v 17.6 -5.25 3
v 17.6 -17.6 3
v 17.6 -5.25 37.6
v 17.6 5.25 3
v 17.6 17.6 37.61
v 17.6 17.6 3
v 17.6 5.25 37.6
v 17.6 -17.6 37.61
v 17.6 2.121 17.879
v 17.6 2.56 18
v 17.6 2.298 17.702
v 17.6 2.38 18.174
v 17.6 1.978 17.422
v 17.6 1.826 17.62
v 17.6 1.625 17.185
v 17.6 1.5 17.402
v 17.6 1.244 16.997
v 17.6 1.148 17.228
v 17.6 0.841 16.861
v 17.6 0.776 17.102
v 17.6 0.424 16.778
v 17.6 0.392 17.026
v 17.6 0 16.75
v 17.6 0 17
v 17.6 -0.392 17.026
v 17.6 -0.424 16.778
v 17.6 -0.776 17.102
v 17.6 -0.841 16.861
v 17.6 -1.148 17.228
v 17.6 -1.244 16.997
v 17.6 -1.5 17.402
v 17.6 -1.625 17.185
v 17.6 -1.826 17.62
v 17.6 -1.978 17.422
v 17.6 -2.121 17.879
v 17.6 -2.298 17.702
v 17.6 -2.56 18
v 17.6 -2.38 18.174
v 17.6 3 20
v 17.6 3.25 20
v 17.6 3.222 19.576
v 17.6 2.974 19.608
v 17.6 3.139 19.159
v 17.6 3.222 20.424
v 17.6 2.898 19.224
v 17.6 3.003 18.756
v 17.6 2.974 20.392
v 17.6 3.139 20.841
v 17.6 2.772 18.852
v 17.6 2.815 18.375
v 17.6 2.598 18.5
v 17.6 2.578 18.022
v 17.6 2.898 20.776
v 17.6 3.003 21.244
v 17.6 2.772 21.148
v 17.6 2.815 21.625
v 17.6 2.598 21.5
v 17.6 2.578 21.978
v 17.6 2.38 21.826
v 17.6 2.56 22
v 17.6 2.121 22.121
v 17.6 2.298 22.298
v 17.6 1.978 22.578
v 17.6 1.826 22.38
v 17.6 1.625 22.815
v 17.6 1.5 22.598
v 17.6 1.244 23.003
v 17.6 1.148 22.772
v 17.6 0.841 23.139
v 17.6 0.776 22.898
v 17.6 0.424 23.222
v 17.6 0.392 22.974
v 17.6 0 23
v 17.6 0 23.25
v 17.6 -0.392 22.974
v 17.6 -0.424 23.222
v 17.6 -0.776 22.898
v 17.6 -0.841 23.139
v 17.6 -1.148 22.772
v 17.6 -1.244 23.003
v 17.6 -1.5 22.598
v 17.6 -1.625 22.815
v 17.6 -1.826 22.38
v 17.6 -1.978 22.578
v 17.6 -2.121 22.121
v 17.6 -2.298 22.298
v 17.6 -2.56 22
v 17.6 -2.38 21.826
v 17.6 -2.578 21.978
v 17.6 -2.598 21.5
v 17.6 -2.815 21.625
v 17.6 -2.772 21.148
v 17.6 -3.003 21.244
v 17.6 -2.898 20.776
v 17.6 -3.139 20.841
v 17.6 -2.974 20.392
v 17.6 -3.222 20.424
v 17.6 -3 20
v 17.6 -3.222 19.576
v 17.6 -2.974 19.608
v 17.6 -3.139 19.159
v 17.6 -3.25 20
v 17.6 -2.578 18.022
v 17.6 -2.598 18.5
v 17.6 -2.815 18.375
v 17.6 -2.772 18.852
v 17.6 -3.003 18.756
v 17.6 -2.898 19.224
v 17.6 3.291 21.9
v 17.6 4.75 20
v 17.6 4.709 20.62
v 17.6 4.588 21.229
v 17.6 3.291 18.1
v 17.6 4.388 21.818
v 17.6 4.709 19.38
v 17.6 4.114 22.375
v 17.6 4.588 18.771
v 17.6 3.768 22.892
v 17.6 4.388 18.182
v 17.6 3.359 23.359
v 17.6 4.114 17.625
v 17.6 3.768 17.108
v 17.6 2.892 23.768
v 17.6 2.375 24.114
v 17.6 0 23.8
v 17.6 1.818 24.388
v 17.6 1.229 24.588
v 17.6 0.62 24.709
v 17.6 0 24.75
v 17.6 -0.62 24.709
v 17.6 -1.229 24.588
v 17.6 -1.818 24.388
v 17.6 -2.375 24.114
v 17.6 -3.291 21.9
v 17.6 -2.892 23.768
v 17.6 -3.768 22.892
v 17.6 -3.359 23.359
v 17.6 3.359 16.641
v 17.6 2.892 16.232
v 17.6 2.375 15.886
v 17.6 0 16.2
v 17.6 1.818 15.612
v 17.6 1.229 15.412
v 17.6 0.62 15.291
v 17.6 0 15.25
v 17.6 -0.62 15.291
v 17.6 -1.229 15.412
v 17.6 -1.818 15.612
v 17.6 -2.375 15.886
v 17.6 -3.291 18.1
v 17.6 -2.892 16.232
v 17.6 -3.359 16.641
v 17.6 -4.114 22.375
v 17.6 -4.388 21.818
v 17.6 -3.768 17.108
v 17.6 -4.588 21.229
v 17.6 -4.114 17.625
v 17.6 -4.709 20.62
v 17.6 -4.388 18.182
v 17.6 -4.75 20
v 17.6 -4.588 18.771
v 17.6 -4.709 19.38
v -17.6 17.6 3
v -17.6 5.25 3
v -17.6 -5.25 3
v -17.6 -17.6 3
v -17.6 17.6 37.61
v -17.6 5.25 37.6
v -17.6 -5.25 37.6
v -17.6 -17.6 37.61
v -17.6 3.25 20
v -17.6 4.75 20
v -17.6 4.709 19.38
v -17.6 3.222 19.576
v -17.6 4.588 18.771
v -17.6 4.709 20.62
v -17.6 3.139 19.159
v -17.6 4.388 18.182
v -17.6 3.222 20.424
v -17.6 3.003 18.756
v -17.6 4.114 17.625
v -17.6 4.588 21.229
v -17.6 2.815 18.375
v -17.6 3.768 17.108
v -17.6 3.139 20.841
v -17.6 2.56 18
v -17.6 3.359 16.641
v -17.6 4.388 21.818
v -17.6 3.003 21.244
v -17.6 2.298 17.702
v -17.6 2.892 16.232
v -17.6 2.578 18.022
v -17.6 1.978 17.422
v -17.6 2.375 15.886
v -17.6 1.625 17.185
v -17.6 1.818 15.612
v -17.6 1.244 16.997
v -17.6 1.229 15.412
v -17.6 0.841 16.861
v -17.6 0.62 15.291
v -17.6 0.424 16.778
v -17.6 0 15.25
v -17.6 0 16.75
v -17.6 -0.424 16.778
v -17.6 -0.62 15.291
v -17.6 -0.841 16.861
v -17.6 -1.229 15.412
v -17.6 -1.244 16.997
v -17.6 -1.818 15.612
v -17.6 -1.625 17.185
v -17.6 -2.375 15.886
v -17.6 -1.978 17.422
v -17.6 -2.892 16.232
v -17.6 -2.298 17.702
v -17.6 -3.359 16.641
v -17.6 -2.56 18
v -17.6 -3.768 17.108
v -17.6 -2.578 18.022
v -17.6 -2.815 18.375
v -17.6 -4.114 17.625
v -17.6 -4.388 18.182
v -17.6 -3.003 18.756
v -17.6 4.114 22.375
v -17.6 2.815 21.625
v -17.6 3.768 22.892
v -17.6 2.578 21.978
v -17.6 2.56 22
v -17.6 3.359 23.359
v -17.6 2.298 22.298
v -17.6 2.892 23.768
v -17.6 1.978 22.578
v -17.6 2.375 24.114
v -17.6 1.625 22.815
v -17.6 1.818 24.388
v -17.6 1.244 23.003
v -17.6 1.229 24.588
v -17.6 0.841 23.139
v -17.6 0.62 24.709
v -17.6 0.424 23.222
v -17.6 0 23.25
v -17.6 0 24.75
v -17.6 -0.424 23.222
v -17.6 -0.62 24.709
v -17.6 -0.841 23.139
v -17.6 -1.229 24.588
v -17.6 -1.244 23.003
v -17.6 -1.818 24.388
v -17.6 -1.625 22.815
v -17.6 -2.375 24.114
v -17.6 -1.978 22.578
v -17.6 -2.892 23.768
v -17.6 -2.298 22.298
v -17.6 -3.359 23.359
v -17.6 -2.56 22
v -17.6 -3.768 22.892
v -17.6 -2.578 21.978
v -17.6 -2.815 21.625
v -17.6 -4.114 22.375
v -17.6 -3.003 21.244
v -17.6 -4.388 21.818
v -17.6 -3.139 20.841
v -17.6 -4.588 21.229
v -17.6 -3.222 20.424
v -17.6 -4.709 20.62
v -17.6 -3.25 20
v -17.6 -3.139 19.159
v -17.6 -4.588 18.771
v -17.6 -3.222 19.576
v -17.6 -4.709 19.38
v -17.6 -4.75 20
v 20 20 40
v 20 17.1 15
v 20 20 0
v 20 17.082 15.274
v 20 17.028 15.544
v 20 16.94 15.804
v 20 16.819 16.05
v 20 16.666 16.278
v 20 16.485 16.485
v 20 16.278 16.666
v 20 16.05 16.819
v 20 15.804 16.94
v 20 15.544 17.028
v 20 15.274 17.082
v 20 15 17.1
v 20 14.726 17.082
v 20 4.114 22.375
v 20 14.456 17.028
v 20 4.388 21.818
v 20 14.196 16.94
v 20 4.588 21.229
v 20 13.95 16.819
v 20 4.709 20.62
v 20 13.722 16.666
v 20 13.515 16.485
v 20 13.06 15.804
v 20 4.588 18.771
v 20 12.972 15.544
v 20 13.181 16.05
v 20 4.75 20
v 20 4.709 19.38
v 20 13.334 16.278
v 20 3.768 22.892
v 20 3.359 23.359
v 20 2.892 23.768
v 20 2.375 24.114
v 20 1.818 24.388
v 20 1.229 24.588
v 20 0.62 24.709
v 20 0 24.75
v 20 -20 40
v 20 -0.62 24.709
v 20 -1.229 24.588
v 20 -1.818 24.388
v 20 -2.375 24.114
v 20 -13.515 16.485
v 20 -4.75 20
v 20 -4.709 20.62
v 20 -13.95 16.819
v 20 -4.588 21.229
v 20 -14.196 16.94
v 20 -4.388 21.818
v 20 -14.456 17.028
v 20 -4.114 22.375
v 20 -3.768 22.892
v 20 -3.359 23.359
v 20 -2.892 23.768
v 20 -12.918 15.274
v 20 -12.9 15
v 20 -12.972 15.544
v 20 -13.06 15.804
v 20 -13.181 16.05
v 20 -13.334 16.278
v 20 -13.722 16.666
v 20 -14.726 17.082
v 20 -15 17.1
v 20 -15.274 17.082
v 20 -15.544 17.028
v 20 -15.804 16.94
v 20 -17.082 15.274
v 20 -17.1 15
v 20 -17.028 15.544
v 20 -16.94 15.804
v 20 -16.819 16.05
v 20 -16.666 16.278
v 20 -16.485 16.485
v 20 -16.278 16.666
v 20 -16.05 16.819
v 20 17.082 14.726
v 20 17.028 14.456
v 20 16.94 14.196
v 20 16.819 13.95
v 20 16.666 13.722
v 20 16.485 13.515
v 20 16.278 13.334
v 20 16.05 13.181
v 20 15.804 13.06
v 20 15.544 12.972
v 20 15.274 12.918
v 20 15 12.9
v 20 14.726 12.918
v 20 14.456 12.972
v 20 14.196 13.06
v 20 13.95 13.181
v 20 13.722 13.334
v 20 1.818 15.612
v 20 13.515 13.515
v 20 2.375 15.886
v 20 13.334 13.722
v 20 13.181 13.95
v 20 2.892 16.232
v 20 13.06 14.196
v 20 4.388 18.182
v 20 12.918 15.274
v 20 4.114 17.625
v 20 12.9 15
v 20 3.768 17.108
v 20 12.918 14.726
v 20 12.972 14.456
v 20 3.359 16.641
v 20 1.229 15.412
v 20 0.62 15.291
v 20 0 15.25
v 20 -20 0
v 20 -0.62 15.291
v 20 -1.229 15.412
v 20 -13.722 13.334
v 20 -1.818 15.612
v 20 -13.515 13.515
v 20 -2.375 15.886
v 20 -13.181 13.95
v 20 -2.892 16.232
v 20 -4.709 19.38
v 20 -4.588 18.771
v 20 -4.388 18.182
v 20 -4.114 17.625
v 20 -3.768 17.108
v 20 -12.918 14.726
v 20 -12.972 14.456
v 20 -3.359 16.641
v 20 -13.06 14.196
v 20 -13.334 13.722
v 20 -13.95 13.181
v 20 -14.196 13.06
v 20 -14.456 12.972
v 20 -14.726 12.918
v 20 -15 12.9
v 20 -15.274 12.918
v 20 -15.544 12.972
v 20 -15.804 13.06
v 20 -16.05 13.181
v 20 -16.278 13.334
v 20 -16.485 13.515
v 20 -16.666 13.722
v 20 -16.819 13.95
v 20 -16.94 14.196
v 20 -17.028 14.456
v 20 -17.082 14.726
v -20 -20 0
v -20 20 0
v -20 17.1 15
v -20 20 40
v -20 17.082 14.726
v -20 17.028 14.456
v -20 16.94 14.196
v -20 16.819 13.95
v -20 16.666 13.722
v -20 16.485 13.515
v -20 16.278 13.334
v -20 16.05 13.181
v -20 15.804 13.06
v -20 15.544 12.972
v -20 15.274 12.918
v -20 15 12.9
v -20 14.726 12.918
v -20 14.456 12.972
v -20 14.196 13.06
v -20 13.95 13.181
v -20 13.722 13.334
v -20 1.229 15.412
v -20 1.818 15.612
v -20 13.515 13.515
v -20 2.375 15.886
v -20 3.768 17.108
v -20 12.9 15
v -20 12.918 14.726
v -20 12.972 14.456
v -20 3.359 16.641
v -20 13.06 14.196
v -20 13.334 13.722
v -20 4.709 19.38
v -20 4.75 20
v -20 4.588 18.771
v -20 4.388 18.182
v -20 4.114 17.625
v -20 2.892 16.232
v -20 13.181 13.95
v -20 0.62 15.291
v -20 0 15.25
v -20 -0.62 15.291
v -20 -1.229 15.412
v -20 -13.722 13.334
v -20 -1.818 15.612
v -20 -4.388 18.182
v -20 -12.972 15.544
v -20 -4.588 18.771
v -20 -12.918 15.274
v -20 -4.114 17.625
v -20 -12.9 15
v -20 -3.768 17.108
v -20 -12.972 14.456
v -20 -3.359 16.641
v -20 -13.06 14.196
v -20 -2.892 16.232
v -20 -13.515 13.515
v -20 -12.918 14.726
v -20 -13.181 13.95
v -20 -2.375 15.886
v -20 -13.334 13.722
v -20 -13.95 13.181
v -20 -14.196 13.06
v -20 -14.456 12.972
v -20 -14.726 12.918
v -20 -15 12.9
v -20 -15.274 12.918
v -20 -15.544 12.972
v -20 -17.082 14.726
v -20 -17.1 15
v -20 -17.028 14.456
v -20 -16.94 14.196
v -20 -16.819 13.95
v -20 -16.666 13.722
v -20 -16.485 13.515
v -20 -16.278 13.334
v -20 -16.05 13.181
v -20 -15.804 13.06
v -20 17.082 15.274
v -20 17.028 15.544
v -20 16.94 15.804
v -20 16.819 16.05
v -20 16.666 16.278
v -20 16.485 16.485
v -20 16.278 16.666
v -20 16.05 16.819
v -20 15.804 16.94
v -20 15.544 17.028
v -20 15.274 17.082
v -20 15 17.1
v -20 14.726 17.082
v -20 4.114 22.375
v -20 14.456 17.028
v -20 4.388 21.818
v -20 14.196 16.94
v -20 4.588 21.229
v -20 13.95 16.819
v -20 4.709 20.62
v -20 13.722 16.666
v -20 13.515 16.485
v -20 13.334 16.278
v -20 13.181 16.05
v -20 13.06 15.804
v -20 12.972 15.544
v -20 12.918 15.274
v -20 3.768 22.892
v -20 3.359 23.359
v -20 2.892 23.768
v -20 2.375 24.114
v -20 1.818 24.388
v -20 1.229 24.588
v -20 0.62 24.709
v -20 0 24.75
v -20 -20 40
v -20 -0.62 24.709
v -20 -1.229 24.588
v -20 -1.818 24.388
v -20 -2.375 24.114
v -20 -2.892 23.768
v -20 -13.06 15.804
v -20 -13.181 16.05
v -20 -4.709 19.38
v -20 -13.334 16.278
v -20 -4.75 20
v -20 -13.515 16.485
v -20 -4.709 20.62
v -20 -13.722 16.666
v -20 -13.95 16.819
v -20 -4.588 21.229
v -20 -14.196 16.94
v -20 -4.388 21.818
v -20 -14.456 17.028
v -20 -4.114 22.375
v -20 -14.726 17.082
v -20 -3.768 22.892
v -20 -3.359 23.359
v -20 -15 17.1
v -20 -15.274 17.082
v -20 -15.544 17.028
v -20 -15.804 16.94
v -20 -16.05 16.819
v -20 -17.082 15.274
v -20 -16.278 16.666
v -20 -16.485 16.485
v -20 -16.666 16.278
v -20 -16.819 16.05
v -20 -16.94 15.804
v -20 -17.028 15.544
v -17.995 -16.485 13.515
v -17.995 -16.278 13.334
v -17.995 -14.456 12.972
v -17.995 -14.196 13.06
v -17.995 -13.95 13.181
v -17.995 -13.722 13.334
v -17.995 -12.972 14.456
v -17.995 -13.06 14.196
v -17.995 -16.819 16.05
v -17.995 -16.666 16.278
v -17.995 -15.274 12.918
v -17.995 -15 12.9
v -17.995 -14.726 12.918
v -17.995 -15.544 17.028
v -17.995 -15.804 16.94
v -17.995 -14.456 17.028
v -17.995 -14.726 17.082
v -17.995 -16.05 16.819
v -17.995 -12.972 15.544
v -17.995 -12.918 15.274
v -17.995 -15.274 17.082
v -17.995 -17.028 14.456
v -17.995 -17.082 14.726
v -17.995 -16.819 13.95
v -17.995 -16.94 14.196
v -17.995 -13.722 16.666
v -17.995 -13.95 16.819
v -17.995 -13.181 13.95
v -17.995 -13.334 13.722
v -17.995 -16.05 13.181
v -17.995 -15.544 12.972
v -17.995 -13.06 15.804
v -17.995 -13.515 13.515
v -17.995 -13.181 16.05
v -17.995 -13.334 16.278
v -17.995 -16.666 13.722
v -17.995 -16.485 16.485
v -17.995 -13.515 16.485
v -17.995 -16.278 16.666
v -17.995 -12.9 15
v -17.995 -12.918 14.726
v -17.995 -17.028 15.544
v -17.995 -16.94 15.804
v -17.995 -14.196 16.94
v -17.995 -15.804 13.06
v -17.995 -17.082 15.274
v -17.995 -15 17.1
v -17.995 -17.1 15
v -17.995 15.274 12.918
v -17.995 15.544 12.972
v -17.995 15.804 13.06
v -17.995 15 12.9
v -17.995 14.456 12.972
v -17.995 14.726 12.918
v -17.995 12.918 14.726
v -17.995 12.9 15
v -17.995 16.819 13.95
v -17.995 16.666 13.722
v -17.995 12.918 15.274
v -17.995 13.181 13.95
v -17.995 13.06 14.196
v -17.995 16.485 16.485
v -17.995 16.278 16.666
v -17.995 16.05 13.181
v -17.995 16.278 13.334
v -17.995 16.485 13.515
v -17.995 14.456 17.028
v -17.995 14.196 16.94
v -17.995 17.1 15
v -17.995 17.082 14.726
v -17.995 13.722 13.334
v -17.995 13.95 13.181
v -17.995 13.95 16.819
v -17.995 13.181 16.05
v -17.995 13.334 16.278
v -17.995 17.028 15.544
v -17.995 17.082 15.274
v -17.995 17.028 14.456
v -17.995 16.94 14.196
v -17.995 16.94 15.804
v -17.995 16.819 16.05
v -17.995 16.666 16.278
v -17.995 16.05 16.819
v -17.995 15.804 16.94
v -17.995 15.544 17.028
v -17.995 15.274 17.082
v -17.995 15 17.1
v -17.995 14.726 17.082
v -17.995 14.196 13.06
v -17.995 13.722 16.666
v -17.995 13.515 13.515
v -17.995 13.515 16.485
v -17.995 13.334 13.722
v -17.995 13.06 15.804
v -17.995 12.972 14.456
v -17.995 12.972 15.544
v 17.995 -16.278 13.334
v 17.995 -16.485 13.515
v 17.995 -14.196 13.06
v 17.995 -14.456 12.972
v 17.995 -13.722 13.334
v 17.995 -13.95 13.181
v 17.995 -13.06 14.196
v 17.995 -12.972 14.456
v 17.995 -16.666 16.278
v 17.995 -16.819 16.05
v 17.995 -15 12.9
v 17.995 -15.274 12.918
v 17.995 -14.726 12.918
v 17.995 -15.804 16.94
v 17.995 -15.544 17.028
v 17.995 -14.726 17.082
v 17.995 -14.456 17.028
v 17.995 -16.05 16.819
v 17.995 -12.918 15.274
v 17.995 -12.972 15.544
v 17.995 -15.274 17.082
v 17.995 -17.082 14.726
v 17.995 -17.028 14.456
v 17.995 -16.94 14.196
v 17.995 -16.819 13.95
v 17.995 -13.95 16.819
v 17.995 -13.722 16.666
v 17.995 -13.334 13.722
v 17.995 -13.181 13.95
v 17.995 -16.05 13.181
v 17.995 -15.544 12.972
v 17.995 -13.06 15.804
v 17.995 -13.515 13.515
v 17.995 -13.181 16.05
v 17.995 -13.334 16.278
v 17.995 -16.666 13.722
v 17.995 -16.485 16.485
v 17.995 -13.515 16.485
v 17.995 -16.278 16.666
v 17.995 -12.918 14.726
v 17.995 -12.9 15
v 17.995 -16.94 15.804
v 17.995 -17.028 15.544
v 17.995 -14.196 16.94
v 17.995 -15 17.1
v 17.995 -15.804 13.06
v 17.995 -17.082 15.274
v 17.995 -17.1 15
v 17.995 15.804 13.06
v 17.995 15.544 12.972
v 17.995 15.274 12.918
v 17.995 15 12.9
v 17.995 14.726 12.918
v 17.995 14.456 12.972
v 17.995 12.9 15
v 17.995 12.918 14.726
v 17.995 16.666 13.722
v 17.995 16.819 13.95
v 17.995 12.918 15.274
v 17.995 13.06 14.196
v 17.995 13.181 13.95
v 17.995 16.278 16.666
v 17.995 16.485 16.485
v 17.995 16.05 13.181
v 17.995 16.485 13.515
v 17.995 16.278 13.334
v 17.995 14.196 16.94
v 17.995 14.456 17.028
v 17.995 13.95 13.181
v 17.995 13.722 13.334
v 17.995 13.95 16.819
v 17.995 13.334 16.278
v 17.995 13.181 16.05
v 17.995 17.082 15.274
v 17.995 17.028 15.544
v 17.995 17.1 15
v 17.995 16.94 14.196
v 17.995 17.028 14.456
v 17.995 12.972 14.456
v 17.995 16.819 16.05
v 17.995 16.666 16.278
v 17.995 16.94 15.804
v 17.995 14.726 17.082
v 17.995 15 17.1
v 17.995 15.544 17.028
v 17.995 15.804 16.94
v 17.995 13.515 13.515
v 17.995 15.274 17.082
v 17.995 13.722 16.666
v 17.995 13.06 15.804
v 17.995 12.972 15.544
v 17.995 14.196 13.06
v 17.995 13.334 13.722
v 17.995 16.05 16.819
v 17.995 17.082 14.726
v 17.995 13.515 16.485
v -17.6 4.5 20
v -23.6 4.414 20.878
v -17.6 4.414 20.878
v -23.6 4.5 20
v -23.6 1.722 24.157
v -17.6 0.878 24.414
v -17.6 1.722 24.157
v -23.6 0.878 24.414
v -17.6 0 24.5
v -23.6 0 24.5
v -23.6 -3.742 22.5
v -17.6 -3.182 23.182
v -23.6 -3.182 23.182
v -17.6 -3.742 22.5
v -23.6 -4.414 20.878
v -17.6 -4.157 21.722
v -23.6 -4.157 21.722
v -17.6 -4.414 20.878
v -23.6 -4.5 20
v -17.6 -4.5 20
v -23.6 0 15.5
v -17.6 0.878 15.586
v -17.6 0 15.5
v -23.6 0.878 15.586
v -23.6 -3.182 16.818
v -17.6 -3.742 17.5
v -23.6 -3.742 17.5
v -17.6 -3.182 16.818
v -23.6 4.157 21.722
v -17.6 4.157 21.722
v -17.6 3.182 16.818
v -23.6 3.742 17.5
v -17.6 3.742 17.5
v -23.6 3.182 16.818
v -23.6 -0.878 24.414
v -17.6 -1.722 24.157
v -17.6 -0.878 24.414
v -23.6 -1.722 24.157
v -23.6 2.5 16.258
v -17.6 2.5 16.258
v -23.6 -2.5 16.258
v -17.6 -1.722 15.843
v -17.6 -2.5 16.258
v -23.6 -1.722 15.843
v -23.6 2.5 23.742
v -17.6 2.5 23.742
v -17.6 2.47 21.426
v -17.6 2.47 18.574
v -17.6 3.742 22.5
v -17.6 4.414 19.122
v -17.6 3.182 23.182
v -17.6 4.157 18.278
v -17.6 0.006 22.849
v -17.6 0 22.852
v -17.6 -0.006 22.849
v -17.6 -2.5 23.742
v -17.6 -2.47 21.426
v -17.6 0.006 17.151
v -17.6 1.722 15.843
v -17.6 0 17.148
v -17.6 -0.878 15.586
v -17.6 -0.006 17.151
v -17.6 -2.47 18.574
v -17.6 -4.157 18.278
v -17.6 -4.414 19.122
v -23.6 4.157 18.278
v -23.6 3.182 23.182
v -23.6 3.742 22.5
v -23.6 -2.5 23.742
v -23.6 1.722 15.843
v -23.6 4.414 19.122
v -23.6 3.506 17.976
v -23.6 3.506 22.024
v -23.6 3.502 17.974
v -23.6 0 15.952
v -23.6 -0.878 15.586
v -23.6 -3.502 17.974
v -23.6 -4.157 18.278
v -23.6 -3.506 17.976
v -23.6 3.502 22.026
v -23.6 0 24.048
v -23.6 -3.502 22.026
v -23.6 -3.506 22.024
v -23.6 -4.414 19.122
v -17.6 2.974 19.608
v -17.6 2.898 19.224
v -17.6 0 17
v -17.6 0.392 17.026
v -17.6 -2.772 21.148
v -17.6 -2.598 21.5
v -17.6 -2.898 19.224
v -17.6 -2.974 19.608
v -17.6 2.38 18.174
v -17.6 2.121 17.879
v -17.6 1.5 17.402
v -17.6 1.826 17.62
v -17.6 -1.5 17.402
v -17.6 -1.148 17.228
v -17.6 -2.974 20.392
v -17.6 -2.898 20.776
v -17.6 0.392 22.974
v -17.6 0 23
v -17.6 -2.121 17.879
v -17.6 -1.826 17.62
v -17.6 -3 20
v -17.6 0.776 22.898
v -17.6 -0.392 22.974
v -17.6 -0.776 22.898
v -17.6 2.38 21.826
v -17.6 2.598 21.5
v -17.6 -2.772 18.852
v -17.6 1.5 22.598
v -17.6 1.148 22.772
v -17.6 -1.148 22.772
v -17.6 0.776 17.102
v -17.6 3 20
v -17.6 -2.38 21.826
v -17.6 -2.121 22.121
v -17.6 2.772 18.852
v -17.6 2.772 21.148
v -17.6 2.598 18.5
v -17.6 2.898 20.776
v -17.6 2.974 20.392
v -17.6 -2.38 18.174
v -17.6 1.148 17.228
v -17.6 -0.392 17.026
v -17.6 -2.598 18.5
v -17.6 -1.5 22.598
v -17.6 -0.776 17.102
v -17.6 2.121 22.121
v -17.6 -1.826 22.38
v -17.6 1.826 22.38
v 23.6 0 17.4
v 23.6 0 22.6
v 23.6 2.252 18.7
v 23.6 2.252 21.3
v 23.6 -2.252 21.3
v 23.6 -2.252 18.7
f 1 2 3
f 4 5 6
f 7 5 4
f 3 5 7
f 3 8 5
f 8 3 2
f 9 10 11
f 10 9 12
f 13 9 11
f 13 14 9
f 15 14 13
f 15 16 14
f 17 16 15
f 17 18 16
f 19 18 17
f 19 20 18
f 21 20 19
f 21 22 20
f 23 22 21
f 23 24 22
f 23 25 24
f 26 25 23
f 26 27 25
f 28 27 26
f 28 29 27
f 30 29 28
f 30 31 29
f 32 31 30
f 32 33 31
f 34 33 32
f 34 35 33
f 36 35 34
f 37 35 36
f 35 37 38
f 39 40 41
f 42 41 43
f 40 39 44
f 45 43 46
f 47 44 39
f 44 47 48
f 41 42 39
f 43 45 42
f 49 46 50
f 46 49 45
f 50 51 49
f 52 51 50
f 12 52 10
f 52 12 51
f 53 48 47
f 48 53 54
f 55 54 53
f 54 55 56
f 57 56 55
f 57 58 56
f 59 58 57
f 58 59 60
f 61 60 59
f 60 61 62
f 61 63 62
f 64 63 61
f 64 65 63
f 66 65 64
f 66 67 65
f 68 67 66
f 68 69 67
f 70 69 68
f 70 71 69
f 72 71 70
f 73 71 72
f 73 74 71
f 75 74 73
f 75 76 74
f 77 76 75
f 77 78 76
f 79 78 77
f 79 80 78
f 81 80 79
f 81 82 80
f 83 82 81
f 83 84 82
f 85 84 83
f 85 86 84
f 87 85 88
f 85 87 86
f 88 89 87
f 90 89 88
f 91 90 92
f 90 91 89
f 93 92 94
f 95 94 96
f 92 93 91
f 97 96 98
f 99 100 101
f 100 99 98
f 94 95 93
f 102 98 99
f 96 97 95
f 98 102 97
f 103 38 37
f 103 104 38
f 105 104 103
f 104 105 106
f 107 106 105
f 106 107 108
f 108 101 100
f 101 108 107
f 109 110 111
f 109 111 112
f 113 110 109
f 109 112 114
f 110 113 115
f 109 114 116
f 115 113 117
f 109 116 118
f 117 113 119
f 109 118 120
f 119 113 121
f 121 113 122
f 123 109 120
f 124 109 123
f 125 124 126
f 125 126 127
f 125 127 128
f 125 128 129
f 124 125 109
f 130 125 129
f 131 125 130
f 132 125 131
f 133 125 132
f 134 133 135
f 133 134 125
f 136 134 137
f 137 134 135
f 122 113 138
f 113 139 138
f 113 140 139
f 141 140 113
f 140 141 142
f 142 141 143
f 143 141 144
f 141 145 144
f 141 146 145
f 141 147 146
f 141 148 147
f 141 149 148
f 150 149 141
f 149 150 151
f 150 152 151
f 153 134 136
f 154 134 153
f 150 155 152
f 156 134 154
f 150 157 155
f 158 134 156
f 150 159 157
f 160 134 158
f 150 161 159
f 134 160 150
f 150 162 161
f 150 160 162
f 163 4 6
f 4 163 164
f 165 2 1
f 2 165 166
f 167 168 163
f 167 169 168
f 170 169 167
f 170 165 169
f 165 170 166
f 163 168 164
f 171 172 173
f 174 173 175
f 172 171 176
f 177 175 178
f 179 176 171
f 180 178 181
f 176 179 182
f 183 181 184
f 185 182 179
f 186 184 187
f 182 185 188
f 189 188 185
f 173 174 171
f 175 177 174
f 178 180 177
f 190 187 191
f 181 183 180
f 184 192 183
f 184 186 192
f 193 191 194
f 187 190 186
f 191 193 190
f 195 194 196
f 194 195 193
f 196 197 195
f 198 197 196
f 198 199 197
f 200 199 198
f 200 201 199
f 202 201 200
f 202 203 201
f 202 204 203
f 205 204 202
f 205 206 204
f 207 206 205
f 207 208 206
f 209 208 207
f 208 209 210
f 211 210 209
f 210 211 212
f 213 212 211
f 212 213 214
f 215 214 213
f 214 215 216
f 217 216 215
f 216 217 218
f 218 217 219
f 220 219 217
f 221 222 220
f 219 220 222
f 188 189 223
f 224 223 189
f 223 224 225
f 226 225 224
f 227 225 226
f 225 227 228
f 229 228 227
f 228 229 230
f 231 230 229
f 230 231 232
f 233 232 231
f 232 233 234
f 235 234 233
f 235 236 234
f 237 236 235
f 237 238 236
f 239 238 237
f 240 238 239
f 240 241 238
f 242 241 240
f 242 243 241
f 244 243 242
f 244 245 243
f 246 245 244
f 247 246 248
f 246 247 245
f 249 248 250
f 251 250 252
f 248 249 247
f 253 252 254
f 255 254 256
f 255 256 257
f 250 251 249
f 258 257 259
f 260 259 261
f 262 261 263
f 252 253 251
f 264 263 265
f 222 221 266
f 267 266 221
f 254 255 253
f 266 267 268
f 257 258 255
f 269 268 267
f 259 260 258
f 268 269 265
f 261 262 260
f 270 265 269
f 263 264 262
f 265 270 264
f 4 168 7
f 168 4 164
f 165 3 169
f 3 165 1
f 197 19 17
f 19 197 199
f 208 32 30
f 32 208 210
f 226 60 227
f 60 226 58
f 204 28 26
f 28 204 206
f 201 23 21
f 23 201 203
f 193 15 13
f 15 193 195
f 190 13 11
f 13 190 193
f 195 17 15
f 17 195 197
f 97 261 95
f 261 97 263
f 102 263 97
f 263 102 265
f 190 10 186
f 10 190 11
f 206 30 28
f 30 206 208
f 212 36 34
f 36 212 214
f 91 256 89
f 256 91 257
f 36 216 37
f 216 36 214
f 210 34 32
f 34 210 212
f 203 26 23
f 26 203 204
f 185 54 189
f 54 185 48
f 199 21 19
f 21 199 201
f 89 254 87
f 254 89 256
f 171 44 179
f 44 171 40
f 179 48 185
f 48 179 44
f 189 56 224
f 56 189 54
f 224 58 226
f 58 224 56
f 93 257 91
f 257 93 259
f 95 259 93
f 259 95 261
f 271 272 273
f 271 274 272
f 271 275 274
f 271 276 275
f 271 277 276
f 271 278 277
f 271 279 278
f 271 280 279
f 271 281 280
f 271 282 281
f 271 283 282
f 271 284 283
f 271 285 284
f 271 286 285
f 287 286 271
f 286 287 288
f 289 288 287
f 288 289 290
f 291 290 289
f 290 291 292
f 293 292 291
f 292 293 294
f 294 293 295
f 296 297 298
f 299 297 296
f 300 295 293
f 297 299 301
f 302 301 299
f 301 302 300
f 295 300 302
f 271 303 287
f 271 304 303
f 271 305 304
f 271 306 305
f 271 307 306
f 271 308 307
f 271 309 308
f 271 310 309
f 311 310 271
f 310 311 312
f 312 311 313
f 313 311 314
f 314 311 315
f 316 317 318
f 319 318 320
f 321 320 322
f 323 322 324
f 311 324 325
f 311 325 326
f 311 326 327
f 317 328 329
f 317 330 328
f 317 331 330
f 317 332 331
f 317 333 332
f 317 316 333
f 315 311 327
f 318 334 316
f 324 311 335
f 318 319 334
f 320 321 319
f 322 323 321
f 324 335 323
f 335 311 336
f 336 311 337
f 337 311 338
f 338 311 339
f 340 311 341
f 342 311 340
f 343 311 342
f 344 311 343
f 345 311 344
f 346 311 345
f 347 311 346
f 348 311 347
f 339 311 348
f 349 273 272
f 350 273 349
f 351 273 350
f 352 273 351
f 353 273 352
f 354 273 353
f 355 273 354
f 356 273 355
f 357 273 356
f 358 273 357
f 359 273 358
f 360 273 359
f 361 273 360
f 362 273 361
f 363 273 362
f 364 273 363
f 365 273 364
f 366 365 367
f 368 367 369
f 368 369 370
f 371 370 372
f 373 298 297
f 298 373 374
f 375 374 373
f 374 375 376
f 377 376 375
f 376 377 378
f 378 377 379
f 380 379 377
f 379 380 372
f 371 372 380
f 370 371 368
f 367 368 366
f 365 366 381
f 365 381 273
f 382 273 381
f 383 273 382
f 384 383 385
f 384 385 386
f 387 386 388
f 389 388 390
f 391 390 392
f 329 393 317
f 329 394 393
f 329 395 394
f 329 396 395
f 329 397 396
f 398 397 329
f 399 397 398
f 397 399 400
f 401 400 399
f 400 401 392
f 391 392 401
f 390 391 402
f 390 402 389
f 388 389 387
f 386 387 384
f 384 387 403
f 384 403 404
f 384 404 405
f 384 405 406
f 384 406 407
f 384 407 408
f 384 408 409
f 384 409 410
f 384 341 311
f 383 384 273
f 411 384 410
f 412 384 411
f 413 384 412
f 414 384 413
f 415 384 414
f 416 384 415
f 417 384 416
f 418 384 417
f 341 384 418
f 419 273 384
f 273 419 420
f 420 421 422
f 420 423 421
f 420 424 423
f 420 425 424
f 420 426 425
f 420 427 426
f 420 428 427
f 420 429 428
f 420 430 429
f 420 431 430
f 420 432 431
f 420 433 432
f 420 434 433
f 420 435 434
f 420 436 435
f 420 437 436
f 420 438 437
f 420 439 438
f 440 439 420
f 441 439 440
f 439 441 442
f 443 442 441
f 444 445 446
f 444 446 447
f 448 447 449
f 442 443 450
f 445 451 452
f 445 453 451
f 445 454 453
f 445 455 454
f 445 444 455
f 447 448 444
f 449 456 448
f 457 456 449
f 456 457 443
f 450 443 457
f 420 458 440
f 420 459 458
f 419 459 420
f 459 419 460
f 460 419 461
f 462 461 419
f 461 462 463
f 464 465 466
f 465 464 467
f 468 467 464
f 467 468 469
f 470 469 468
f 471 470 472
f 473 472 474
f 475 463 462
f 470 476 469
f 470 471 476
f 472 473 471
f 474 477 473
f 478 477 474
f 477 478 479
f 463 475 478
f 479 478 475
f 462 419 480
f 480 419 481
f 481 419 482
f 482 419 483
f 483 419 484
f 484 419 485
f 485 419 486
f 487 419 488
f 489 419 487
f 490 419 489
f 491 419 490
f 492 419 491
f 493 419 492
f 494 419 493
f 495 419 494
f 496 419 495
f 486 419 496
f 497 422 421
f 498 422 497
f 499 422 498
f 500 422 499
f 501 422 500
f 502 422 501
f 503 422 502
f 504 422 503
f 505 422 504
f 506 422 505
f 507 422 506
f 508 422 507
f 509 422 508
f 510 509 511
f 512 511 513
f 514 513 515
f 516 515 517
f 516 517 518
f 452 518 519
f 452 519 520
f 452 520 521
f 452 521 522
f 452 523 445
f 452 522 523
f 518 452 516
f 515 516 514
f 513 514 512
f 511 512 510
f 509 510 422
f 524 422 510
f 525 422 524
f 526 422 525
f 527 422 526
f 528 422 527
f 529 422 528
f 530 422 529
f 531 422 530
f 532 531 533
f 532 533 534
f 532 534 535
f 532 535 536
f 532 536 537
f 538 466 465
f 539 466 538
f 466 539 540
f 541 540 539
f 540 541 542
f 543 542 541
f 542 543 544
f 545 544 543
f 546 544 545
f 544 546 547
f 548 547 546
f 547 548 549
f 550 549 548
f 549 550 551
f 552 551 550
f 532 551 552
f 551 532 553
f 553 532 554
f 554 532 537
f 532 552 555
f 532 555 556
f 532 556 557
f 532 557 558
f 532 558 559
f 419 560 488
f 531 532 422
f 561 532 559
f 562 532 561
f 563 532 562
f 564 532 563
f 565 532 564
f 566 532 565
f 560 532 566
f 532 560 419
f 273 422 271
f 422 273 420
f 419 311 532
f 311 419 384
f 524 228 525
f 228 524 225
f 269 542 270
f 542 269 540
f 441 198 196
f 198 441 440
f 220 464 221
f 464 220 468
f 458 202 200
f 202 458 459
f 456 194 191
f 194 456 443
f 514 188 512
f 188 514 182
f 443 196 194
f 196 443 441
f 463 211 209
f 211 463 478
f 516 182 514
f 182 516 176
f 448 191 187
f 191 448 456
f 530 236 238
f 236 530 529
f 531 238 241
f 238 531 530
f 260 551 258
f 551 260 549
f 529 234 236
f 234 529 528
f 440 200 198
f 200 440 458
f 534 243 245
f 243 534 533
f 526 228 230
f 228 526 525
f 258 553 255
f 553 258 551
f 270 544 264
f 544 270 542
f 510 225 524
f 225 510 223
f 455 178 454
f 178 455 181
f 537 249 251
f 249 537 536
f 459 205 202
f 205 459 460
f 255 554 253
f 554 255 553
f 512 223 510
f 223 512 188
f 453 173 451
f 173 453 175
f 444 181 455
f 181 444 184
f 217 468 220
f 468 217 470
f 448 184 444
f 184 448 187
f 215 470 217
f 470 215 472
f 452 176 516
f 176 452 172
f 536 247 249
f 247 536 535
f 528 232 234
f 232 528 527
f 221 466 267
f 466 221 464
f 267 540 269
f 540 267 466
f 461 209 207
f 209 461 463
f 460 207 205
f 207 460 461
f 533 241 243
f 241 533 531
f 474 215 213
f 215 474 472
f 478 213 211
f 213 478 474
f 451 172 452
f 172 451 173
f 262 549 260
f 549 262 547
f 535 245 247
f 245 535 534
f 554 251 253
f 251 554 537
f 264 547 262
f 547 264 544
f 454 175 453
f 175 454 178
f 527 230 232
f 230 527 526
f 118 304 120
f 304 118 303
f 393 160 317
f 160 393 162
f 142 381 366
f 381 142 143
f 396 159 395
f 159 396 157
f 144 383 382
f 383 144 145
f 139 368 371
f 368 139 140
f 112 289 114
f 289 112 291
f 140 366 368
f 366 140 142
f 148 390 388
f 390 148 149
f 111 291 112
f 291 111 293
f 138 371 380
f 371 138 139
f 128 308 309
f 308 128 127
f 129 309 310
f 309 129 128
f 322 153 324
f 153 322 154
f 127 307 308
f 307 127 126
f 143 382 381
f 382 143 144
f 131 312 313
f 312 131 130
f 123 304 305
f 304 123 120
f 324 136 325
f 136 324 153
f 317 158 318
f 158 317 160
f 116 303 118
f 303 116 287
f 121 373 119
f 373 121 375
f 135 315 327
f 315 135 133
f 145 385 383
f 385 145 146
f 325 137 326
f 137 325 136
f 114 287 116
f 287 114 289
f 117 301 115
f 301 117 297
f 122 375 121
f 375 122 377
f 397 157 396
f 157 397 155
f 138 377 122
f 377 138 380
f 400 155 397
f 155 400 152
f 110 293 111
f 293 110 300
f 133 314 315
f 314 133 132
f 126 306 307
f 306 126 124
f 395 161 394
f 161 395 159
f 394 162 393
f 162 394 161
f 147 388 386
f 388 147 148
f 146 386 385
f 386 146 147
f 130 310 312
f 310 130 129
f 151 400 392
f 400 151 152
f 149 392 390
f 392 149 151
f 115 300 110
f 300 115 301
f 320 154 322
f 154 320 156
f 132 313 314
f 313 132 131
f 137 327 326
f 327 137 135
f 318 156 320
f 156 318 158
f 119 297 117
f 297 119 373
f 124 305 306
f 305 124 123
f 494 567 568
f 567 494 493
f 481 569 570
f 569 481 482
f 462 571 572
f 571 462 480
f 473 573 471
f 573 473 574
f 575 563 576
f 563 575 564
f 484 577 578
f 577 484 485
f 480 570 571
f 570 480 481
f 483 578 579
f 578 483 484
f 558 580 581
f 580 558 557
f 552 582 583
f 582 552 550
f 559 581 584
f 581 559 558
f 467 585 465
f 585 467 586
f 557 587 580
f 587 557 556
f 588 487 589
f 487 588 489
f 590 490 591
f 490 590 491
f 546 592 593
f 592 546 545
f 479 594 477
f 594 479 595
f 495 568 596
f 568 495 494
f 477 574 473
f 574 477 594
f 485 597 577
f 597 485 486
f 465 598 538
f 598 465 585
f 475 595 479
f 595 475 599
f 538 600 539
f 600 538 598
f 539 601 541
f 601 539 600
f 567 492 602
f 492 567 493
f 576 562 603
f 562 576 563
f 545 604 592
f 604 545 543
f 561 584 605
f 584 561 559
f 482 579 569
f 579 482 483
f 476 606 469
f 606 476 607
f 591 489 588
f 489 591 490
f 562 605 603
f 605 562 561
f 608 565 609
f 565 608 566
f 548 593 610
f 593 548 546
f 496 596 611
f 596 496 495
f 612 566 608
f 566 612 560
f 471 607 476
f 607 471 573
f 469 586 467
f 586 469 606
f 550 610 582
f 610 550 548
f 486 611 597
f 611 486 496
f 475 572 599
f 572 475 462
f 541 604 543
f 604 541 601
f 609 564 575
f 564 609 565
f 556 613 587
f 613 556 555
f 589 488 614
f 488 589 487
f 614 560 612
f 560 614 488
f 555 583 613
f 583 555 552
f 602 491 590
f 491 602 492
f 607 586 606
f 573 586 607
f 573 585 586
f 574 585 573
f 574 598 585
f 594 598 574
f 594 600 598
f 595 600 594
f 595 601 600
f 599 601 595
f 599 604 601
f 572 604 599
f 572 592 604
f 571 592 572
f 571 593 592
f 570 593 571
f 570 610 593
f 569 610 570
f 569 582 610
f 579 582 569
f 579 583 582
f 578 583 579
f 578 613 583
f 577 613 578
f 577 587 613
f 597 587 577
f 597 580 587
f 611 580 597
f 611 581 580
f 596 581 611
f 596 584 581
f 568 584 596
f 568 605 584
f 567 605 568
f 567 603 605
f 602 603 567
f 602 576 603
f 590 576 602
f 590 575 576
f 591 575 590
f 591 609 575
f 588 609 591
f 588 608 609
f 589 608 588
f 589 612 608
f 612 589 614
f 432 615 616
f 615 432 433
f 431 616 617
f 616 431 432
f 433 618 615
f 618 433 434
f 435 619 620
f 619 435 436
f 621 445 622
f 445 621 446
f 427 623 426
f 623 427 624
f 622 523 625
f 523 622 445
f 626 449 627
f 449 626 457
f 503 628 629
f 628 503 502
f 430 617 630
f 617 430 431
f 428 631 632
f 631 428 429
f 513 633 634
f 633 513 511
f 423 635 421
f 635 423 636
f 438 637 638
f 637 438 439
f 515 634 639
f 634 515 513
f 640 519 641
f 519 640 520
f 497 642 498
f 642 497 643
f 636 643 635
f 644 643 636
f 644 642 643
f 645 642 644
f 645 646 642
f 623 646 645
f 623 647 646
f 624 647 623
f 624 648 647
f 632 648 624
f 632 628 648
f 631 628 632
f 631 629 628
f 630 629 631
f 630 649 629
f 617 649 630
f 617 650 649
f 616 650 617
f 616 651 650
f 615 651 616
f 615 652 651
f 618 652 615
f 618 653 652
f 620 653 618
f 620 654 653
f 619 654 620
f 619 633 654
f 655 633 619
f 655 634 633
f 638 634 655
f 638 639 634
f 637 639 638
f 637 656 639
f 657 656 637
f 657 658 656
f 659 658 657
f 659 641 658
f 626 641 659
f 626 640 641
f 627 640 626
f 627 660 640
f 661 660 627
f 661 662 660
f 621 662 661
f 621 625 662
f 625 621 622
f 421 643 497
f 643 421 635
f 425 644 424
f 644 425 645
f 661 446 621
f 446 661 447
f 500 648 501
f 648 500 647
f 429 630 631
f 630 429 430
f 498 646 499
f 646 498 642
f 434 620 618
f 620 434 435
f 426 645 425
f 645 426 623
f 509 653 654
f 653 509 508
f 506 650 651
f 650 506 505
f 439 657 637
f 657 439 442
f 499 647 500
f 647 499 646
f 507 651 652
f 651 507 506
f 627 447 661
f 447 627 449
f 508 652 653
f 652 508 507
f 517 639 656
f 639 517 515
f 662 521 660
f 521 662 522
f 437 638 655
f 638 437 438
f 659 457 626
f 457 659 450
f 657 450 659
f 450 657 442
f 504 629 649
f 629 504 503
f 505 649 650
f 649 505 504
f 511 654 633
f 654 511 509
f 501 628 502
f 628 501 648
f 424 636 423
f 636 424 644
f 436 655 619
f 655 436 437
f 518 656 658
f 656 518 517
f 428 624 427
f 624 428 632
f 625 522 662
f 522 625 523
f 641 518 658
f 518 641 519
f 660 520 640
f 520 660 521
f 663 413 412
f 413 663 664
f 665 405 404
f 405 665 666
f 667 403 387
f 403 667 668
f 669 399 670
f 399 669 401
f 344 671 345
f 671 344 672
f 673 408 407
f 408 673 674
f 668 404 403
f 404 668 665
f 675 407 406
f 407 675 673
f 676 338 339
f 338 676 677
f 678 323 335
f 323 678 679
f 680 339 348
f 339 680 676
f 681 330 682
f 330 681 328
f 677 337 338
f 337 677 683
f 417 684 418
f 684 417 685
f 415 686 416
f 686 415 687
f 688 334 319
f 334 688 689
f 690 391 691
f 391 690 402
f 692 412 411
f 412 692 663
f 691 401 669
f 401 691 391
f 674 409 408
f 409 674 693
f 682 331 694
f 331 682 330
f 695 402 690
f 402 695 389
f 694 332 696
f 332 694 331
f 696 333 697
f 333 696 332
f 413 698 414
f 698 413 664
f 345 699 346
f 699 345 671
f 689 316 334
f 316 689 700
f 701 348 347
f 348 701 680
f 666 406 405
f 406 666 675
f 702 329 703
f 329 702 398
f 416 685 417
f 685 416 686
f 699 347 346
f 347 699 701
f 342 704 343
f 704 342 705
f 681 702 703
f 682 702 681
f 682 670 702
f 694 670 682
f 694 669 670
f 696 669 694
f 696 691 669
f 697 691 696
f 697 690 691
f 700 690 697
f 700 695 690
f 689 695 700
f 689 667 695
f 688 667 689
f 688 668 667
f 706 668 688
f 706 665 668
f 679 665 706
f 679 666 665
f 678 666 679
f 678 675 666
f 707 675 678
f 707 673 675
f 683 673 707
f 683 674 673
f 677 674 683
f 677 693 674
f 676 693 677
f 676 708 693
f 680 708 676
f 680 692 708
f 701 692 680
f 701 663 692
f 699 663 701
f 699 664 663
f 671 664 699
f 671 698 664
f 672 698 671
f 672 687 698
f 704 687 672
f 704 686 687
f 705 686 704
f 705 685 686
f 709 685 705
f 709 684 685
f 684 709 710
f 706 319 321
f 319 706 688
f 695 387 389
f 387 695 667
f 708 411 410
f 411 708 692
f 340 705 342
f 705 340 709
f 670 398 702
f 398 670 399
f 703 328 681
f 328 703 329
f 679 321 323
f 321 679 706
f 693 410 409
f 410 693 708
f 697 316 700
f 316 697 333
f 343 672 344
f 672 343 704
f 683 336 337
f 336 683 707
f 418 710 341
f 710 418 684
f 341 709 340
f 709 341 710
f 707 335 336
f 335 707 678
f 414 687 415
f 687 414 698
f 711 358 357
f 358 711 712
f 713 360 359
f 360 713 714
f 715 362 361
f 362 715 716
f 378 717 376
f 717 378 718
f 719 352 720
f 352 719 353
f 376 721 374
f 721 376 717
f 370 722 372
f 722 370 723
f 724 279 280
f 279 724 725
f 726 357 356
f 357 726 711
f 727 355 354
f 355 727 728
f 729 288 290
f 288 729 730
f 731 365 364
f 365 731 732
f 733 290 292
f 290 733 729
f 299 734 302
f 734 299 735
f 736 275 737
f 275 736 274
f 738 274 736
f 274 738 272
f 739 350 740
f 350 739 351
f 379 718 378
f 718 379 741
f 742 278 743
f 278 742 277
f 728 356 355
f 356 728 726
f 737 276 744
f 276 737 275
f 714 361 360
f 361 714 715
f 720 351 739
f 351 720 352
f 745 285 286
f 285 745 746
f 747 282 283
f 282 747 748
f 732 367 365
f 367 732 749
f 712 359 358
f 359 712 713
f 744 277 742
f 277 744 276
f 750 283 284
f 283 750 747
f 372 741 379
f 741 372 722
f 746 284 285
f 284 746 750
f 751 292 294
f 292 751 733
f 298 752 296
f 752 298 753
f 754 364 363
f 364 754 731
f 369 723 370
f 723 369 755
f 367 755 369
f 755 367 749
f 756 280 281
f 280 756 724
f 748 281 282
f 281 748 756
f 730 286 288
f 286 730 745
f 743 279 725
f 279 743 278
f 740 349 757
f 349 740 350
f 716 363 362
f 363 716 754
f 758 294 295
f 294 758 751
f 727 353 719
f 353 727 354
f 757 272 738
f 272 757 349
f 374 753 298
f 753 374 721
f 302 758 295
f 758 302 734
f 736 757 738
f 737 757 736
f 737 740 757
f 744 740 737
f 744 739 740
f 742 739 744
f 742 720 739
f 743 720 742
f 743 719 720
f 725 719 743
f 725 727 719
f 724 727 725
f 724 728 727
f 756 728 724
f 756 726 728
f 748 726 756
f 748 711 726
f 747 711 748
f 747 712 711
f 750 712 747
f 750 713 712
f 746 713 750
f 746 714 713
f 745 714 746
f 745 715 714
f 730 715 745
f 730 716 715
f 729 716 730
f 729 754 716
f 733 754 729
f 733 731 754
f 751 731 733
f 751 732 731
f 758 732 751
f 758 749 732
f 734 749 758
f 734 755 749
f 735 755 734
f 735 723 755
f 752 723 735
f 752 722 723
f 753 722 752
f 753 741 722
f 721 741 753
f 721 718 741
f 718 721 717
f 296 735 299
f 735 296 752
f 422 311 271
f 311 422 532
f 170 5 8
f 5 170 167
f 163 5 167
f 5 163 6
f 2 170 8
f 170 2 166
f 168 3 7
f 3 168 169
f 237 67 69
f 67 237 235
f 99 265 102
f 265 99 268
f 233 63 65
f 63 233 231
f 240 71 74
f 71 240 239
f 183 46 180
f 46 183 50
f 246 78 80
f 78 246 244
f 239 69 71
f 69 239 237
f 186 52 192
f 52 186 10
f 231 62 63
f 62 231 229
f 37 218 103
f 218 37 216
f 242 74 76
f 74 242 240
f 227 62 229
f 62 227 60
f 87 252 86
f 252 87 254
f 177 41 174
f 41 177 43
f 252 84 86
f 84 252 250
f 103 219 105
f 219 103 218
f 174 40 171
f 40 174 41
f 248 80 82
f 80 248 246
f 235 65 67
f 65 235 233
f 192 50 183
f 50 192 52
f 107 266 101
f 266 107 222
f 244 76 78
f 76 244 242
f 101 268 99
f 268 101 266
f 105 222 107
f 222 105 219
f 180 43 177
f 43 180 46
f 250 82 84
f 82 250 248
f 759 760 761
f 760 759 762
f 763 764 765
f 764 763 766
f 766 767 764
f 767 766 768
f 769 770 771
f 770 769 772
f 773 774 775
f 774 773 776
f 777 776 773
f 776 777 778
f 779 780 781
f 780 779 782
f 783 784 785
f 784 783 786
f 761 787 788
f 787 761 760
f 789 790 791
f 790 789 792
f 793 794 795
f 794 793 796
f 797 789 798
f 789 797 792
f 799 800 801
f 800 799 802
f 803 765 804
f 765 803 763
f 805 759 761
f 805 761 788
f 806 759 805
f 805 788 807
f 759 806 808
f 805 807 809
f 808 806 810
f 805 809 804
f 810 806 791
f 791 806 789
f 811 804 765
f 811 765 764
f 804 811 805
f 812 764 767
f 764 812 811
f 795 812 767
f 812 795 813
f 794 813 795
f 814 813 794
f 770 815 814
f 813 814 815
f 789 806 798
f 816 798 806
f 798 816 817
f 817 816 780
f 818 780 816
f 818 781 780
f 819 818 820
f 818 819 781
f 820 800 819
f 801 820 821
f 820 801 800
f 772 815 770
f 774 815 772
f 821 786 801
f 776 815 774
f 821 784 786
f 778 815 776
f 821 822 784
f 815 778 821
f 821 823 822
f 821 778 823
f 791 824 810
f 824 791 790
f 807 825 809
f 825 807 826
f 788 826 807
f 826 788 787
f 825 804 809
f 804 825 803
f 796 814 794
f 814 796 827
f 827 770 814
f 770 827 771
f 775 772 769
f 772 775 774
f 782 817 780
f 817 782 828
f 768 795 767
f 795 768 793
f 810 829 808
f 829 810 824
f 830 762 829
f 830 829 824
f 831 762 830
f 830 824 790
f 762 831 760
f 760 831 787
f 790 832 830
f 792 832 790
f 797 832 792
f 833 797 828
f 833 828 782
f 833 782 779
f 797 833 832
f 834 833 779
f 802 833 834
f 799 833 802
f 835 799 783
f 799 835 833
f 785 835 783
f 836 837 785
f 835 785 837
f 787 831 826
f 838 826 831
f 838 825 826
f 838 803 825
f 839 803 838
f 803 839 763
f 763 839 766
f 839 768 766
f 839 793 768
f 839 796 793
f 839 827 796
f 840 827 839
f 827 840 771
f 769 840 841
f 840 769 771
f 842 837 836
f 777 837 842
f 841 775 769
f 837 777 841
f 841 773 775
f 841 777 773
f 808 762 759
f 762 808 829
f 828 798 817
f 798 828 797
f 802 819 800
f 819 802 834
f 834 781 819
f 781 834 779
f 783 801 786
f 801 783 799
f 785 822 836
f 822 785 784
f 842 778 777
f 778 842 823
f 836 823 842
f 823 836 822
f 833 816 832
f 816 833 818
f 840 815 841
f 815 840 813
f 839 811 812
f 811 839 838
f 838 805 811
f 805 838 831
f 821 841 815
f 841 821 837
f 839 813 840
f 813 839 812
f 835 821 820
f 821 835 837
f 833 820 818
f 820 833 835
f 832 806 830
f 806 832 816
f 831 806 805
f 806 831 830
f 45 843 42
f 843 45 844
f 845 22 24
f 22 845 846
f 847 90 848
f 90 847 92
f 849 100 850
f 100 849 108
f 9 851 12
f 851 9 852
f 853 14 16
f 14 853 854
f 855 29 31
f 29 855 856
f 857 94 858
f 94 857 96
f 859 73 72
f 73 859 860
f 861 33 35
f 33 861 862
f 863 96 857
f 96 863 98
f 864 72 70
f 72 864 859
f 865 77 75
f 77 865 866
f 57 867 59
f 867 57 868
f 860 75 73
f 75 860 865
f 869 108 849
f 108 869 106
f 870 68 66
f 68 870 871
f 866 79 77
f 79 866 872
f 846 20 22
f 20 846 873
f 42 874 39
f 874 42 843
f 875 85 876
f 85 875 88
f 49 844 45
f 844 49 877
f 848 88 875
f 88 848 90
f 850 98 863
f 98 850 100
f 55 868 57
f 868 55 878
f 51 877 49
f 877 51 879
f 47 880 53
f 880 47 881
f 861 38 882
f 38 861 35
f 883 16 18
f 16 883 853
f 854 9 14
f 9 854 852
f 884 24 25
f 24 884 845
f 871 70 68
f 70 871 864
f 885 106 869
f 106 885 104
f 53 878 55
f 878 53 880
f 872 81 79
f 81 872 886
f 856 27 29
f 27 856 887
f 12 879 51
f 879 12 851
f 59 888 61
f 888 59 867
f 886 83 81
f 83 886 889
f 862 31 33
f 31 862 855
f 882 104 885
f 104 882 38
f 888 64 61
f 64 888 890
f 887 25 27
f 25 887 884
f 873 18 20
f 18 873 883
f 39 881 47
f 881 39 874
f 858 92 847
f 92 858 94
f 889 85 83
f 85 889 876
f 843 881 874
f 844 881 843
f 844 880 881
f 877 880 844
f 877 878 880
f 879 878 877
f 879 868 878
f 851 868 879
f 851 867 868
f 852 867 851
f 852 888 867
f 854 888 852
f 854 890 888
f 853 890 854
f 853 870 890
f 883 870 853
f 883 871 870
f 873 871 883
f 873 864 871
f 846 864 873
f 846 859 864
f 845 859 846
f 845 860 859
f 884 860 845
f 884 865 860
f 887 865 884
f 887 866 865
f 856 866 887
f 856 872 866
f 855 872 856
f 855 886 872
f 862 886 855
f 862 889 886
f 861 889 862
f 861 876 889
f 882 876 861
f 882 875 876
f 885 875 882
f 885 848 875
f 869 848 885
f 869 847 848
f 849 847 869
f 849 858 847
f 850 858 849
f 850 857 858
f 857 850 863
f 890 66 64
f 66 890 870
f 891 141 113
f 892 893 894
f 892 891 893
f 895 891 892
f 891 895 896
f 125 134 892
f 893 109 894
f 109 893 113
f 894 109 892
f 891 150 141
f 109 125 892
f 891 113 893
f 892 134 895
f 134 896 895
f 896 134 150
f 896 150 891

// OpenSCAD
// lovelace primitive power extender v0.0.1
// Registry-driven starter implementation:
// - removable bottom plate with lower holders
// - upper shell with mirrored upper holders
// - rotor set generated from the same registry

$fn = 48;

eps = 0.01;

// Envelope + printability defaults (aligned with README draft).
cube_side = 40.0;
cube_wall_t = 2.4;
top_t = 2.4;
bottom_plate_t = 3.0;
holder_rib_t = 2.0;
holder_seat_t = 2.0;
rotor_radial_clearance = 0.25;
coupler_slip_clearance = 0.25;

// Coupler and magnet defaults.
coupler_len = 6.0;
coupler_outer_d = 9.0;
magnet_d = 4.2;           // hole diameter for nominal 4 mm magnets (+clearance)
magnet_depth = 2.0;
magnet_corner_offset_y = 5.0;
magnet_corner_offset_z = 5.0;

// Rotor registry entry indexes.
IDX_NAME = 0;
IDX_AXIS = 1;
IDX_CENTER = 2;
IDX_DIAMETER = 3;
IDX_SPAN = 4;

// v0.0.1 starter registry: single power rotor crossing left-right.
rotor_registry = [
    ["power_main", "x", [0, 0, cube_side / 2], 6.0, cube_side - 2 * cube_wall_t]
];

function rotor_name(r) = r[IDX_NAME];
function rotor_axis(r) = r[IDX_AXIS];
function rotor_center(r) = r[IDX_CENTER];
function rotor_diameter(r) = r[IDX_DIAMETER];
function rotor_span(r) = r[IDX_SPAN];

function holder_tunnel_d(r) = rotor_diameter(r) + 2 * rotor_radial_clearance;
function coupler_base_r(r) = rotor_diameter(r) / 2 + 0.8;
function coupler_tip_r(r) = max(1.6, coupler_base_r(r) - 1.2);

module primitive_power_extender_0_0_1(show_bottom = true, show_shell = true, show_rotors = true) {
    if (show_bottom) {
        color([0.82, 0.84, 0.88]) bottom_plate(rotor_registry);
    }

    if (show_shell) {
        color([0.92, 0.92, 0.95]) upper_shell(rotor_registry);
    }

    if (show_rotors) {
        color([0.75, 0.57, 0.35]) rotor_set(rotor_registry);
    }
}

module bottom_plate(registry) {
    union() {
        translate([-cube_side / 2, -cube_side / 2, 0])
            cube([cube_side, cube_side, bottom_plate_t]);

        for (r = registry) {
            lower_holder_from_rotor(r);
        }
    }
}

module upper_shell(registry) {
    union() {
        difference() {
            outer_shell_body();
            inner_cavity_cutout();

            for (r = registry) {
                rotor_passage_cutout(r);
                coupler_face_port_cutout(r);
            }

            side_face_magnet_recesses();
        }

        for (r = registry) {
            upper_holder_from_rotor(r);
        }
    }
}

module outer_shell_body() {
    translate([-cube_side / 2, -cube_side / 2, bottom_plate_t])
        cube([cube_side, cube_side, cube_side - bottom_plate_t]);
}

module inner_cavity_cutout() {
    inner_side = cube_side - 2 * cube_wall_t;
    cavity_h = cube_side - bottom_plate_t - top_t + eps;

    translate([-inner_side / 2, -inner_side / 2, bottom_plate_t])
        cube([inner_side, inner_side, cavity_h]);
}

module rotor_passage_cutout(r) {
    c = rotor_center(r);

    if (rotor_axis(r) == "x") {
        translate(c)
            rotate([0, 90, 0])
                cylinder(h = cube_side + 2 * eps, d = holder_tunnel_d(r) + 0.6, center = true);
    }
}

module coupler_face_port_cutout(r) {
    c = rotor_center(r);

    if (rotor_axis(r) == "x") {
        for (x_sign = [-1, 1]) {
            translate([x_sign * (cube_side / 2 - cube_wall_t / 2), c[1], c[2]])
                rotate([0, 90, 0])
                    cylinder(
                        h = cube_wall_t + 2 * eps,
                        d = coupler_outer_d + 2 * coupler_slip_clearance,
                        center = true
                    );
        }
    }
}

module side_face_magnet_recesses() {
    for (x_sign = [-1, 1]) {
        for (y_sign = [-1, 1]) {
            for (z_sign = [-1, 1]) {
                translate([
                    x_sign * (cube_side / 2 - magnet_depth / 2),
                    y_sign * (cube_side / 2 - magnet_corner_offset_y),
                    z_sign * (cube_side / 2 - magnet_corner_offset_z)
                ])
                    rotate([0, 90, 0])
                        cylinder(h = magnet_depth + eps, d = magnet_d, center = true);
            }
        }
    }
}

module lower_holder_from_rotor(r) {
    c = rotor_center(r);

    if (rotor_axis(r) == "x") {
        holder_len = rotor_span(r);
        holder_w = holder_tunnel_d(r) + 2 * holder_rib_t;
        holder_h = max(holder_seat_t * 2, c[2] - bottom_plate_t + holder_seat_t);

        translate([c[0], c[1], bottom_plate_t + holder_h / 2])
            difference() {
                cube([holder_len, holder_w, holder_h], center = true);

                translate([0, 0, c[2] - (bottom_plate_t + holder_h / 2)])
                    rotate([0, 90, 0])
                        cylinder(h = holder_len + 2 * eps, d = holder_tunnel_d(r), center = true);
            }
    }
}

module upper_holder_from_rotor(r) {
    c = rotor_center(r);
    z_top_inner = cube_side - top_t;

    if (rotor_axis(r) == "x") {
        holder_len = rotor_span(r);
        holder_w = holder_tunnel_d(r) + 2 * holder_rib_t;
        holder_h = max(holder_seat_t * 2, z_top_inner - c[2] + holder_seat_t);

        translate([c[0], c[1], z_top_inner - holder_h / 2])
            difference() {
                cube([holder_len, holder_w, holder_h], center = true);

                translate([0, 0, c[2] - (z_top_inner - holder_h / 2)])
                    rotate([0, 90, 0])
                        cylinder(h = holder_len + 2 * eps, d = holder_tunnel_d(r), center = true);
            }
    }
}

module rotor_set(registry) {
    for (r = registry) {
        rotor_from_registry(r);
    }
}

module rotor_from_registry(r) {
    c = rotor_center(r);

    if (rotor_axis(r) == "x") {
        // Main through-shaft.
        translate(c)
            rotate([0, 90, 0])
                cylinder(h = rotor_span(r), d = rotor_diameter(r), center = true);

        // Right-side convex keyed coupler (output).
        translate([c[0] + rotor_span(r) / 2, c[1], c[2]])
            rotate([0, 90, 0])
                keyed_male_coupler(coupler_len, coupler_base_r(r), coupler_tip_r(r));

        // Left-side concave keyed coupler (input).
        translate([c[0] - rotor_span(r) / 2, c[1], c[2]])
            rotate([0, -90, 0])
                keyed_female_coupler(coupler_len, coupler_outer_d / 2, coupler_base_r(r), coupler_tip_r(r), coupler_slip_clearance);
    }
}

module keyed_male_coupler(len, r_base, r_tip) {
    // Hex/frustum profile approximates a printable keyed "toothed cone".
    cylinder(h = len, r1 = r_base, r2 = r_tip, center = false, $fn = 6);
}

module keyed_female_coupler(len, outer_r, male_r_base, male_r_tip, slip_clearance) {
    difference() {
        cylinder(h = len, r = outer_r, center = false, $fn = 32);
        translate([0, 0, -eps])
            cylinder(
                h = len + 2 * eps,
                r1 = male_r_tip + slip_clearance,
                r2 = male_r_base + slip_clearance,
                center = false,
                $fn = 6
            );
    }
}

// Default preview.
primitive_power_extender_0_0_1();
